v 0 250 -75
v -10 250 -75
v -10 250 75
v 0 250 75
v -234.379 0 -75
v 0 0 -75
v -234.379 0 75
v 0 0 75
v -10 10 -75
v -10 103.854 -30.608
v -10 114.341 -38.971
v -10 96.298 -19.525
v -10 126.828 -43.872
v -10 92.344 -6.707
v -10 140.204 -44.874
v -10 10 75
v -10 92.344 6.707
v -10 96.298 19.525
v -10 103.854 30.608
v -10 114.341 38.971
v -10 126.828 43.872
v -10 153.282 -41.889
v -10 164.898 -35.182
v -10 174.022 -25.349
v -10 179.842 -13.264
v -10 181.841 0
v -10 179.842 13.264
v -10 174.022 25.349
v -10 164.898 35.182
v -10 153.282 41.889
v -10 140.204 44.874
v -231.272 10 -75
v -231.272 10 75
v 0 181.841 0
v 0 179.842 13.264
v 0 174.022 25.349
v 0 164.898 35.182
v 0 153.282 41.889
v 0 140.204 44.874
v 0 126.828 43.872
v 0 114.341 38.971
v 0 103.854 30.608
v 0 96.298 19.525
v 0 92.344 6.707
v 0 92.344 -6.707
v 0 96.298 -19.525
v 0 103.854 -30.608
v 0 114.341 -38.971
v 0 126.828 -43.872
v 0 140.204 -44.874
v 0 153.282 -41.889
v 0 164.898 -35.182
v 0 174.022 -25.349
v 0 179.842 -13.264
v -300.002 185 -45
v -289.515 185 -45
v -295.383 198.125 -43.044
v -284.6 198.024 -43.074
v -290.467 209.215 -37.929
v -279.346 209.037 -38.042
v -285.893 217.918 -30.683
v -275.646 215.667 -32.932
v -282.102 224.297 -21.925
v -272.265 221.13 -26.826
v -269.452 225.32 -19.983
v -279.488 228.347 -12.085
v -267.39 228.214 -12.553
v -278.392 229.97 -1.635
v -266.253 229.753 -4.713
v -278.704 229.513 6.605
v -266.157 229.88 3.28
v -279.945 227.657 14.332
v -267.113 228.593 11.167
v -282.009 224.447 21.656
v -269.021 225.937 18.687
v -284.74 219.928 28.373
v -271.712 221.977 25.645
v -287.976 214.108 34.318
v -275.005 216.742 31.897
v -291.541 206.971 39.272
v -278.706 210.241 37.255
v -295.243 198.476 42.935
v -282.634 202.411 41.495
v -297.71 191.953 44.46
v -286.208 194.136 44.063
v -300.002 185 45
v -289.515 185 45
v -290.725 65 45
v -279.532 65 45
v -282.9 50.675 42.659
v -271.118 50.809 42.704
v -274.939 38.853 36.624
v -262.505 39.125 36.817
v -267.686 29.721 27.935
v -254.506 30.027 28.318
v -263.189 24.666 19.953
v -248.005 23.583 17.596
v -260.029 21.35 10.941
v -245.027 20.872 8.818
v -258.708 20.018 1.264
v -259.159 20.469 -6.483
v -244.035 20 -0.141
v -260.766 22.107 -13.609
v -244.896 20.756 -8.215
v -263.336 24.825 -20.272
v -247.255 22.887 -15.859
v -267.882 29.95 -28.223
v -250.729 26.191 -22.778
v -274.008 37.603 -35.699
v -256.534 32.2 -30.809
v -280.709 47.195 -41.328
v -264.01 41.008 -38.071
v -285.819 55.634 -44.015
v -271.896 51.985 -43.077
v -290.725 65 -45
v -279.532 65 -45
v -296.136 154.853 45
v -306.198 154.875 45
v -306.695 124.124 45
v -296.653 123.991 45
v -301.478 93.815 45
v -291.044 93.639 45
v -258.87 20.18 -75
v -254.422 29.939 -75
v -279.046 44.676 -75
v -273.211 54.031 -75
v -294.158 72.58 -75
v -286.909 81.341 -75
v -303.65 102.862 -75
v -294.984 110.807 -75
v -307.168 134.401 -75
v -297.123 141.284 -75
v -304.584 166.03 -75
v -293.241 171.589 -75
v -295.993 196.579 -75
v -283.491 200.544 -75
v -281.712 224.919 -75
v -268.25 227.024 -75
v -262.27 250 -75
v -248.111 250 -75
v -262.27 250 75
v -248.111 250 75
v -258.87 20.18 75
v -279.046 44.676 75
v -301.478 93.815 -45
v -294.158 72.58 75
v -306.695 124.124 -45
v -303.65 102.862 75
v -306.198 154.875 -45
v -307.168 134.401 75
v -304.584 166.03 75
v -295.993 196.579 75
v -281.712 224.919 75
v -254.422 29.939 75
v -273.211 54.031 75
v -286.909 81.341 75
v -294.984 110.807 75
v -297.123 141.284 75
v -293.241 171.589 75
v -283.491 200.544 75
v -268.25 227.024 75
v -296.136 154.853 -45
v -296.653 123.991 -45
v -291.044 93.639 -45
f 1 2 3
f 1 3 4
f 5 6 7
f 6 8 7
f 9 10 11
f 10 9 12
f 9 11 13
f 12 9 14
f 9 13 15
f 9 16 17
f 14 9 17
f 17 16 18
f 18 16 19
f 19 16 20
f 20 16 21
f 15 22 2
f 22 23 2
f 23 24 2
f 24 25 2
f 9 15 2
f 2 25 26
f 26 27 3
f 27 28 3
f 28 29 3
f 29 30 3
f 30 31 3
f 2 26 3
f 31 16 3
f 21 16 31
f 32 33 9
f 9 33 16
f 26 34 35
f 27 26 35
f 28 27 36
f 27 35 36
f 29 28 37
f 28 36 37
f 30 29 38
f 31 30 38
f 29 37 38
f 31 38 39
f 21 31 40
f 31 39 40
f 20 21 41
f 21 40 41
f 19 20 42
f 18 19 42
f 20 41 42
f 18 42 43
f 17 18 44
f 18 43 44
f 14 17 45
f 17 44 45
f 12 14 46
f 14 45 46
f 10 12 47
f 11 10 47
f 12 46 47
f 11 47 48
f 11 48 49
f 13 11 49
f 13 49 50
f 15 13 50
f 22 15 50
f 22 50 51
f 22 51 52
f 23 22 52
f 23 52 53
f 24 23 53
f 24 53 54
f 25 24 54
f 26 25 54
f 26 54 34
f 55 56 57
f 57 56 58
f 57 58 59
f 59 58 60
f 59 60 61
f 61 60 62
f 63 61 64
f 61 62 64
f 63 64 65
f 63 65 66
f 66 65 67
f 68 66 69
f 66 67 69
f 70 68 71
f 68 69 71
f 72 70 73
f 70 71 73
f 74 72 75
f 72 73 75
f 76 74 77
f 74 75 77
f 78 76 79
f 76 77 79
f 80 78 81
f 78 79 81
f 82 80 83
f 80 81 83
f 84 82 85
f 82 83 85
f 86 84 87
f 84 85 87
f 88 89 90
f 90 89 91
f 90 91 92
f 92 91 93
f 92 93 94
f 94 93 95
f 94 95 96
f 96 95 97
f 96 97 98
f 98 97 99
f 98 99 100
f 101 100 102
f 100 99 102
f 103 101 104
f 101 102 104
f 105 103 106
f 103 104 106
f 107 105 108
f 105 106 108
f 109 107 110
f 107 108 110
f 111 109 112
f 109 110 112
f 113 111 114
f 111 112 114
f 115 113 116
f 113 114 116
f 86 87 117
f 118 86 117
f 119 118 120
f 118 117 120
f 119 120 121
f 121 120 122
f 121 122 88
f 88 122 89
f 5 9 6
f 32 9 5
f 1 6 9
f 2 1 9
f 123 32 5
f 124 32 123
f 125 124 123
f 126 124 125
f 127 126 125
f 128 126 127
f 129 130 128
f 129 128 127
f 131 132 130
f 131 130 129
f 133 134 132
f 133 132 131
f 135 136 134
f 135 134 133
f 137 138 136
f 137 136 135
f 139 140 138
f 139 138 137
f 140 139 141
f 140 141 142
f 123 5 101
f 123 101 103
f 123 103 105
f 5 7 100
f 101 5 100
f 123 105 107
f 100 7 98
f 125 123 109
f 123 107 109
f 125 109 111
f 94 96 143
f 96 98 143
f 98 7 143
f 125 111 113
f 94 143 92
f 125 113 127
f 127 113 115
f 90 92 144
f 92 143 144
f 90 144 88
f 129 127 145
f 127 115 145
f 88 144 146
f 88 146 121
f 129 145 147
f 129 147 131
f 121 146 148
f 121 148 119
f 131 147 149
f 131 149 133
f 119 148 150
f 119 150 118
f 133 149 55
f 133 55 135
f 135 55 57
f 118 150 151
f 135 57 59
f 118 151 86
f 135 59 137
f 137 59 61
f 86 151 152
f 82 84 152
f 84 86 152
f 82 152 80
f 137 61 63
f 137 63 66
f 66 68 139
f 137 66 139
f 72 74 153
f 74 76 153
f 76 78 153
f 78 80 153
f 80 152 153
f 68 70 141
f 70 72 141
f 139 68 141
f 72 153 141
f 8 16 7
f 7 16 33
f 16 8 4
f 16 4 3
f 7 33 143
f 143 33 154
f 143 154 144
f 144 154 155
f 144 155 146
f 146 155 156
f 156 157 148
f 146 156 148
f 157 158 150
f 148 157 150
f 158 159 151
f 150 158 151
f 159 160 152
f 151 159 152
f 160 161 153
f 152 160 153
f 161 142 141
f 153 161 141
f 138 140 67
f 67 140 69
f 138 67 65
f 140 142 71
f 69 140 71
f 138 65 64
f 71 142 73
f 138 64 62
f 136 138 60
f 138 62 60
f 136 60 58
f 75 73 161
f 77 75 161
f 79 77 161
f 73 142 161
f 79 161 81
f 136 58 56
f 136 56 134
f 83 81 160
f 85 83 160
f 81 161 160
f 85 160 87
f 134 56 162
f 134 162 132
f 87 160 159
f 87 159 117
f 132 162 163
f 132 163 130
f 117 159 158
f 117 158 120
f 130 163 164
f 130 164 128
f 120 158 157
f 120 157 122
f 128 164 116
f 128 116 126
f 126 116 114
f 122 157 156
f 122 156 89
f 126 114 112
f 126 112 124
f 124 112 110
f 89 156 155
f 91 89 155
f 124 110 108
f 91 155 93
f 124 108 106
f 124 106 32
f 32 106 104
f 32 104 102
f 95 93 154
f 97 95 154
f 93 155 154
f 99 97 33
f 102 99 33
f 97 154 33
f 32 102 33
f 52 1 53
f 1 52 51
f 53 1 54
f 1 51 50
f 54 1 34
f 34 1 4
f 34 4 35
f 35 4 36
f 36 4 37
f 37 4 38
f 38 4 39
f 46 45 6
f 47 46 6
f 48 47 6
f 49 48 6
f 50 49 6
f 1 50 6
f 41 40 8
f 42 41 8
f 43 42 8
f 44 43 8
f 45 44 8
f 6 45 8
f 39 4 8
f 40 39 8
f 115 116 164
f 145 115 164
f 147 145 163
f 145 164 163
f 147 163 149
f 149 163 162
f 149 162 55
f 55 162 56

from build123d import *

# Parameters (mm, degrees)
SALIENTE_EXTRUIR1_DEPTH    = 75
CORTAR_EXTRUIR1_REACH      = 405.099
CROQUIS2_R                 = 45
CORTAR_EXTRUIR2_REACH      = 397.531
CORTAR_EXTRUIR2_END_RADIUS = 165


with BuildPart() as part:
    # Croquis1 → Saliente-Extruir1 (new, symmetric)
    with BuildSketch(Plane.XY):
        with BuildLine():
            Line((-10, 250), (0, 250))
            Line((0, 250), (0, 0))
            Line((0, 0), (-234.378862456, 0))
            ThreePointArc((-234.378862456, 0), (-306.168920604, 118.546607009), (-262.269991763, 250))
            Line((-262.269991763, 250), (-248.111243039, 250))
            ThreePointArc((-248.111243039, 250), (-296.806166022, 125.992691614), (-231.272178278, 10))
            Line((-231.272178278, 10), (-10, 10))
            Line((-10, 10), (-10, 250))
        make_face()
    extrude(amount=SALIENTE_EXTRUIR1_DEPTH, both=True)

    # Croquis2 → Cortar-Extruir1 (cut, up to next)
    with BuildSketch(Plane(origin=(0, 0, 0), x_dir=(0, 0, -1), z_dir=(1, 0, 0)), mode=Mode.PRIVATE) as cortar_extruir1_sk1:
        with Locations(Location((0, 136.841249694, 0), (0, 0, 90))):
            Circle(CROQUIS2_R)
    cortar_extruir1_tool1 = extrude(cortar_extruir1_sk1.sketch, amount=-CORTAR_EXTRUIR1_REACH, mode=Mode.PRIVATE) & part.part
    add(cortar_extruir1_tool1.solids().sort_by_distance((0, 136.84125, 0))[0], mode=Mode.SUBTRACT)

    # Cortar-Extruir2: up to this cylinder (the profile starts inside it)
    cortar_extruir2_end = Plane(origin=(-142.186281275, 136.841251, 0), z_dir=(0, 0, -1)) * Cylinder(CORTAR_EXTRUIR2_END_RADIUS, 1126.062, mode=Mode.PRIVATE)
    # Croquis3 → Cortar-Extruir2 (cut, up to the surface)
    with BuildSketch(Plane.ZY.offset(10), mode=Mode.PRIVATE) as cortar_extruir2_sk1:
        with BuildLine():
            Line((45, 185), (45, 65))
            ThreePointArc((45, 65), (0, 20), (-45, 65))
            Line((-45, 65), (-45, 185))
            ThreePointArc((-45, 185), (0, 230), (45, 185))
        make_face()
    cortar_extruir2_tool1 = extrude(cortar_extruir2_sk1.sketch, amount=CORTAR_EXTRUIR2_REACH, mode=Mode.PRIVATE) & cortar_extruir2_end
    add(cortar_extruir2_tool1.solids().sort_by_distance((-10, 125, 0))[0], mode=Mode.SUBTRACT)


solid = part.part
